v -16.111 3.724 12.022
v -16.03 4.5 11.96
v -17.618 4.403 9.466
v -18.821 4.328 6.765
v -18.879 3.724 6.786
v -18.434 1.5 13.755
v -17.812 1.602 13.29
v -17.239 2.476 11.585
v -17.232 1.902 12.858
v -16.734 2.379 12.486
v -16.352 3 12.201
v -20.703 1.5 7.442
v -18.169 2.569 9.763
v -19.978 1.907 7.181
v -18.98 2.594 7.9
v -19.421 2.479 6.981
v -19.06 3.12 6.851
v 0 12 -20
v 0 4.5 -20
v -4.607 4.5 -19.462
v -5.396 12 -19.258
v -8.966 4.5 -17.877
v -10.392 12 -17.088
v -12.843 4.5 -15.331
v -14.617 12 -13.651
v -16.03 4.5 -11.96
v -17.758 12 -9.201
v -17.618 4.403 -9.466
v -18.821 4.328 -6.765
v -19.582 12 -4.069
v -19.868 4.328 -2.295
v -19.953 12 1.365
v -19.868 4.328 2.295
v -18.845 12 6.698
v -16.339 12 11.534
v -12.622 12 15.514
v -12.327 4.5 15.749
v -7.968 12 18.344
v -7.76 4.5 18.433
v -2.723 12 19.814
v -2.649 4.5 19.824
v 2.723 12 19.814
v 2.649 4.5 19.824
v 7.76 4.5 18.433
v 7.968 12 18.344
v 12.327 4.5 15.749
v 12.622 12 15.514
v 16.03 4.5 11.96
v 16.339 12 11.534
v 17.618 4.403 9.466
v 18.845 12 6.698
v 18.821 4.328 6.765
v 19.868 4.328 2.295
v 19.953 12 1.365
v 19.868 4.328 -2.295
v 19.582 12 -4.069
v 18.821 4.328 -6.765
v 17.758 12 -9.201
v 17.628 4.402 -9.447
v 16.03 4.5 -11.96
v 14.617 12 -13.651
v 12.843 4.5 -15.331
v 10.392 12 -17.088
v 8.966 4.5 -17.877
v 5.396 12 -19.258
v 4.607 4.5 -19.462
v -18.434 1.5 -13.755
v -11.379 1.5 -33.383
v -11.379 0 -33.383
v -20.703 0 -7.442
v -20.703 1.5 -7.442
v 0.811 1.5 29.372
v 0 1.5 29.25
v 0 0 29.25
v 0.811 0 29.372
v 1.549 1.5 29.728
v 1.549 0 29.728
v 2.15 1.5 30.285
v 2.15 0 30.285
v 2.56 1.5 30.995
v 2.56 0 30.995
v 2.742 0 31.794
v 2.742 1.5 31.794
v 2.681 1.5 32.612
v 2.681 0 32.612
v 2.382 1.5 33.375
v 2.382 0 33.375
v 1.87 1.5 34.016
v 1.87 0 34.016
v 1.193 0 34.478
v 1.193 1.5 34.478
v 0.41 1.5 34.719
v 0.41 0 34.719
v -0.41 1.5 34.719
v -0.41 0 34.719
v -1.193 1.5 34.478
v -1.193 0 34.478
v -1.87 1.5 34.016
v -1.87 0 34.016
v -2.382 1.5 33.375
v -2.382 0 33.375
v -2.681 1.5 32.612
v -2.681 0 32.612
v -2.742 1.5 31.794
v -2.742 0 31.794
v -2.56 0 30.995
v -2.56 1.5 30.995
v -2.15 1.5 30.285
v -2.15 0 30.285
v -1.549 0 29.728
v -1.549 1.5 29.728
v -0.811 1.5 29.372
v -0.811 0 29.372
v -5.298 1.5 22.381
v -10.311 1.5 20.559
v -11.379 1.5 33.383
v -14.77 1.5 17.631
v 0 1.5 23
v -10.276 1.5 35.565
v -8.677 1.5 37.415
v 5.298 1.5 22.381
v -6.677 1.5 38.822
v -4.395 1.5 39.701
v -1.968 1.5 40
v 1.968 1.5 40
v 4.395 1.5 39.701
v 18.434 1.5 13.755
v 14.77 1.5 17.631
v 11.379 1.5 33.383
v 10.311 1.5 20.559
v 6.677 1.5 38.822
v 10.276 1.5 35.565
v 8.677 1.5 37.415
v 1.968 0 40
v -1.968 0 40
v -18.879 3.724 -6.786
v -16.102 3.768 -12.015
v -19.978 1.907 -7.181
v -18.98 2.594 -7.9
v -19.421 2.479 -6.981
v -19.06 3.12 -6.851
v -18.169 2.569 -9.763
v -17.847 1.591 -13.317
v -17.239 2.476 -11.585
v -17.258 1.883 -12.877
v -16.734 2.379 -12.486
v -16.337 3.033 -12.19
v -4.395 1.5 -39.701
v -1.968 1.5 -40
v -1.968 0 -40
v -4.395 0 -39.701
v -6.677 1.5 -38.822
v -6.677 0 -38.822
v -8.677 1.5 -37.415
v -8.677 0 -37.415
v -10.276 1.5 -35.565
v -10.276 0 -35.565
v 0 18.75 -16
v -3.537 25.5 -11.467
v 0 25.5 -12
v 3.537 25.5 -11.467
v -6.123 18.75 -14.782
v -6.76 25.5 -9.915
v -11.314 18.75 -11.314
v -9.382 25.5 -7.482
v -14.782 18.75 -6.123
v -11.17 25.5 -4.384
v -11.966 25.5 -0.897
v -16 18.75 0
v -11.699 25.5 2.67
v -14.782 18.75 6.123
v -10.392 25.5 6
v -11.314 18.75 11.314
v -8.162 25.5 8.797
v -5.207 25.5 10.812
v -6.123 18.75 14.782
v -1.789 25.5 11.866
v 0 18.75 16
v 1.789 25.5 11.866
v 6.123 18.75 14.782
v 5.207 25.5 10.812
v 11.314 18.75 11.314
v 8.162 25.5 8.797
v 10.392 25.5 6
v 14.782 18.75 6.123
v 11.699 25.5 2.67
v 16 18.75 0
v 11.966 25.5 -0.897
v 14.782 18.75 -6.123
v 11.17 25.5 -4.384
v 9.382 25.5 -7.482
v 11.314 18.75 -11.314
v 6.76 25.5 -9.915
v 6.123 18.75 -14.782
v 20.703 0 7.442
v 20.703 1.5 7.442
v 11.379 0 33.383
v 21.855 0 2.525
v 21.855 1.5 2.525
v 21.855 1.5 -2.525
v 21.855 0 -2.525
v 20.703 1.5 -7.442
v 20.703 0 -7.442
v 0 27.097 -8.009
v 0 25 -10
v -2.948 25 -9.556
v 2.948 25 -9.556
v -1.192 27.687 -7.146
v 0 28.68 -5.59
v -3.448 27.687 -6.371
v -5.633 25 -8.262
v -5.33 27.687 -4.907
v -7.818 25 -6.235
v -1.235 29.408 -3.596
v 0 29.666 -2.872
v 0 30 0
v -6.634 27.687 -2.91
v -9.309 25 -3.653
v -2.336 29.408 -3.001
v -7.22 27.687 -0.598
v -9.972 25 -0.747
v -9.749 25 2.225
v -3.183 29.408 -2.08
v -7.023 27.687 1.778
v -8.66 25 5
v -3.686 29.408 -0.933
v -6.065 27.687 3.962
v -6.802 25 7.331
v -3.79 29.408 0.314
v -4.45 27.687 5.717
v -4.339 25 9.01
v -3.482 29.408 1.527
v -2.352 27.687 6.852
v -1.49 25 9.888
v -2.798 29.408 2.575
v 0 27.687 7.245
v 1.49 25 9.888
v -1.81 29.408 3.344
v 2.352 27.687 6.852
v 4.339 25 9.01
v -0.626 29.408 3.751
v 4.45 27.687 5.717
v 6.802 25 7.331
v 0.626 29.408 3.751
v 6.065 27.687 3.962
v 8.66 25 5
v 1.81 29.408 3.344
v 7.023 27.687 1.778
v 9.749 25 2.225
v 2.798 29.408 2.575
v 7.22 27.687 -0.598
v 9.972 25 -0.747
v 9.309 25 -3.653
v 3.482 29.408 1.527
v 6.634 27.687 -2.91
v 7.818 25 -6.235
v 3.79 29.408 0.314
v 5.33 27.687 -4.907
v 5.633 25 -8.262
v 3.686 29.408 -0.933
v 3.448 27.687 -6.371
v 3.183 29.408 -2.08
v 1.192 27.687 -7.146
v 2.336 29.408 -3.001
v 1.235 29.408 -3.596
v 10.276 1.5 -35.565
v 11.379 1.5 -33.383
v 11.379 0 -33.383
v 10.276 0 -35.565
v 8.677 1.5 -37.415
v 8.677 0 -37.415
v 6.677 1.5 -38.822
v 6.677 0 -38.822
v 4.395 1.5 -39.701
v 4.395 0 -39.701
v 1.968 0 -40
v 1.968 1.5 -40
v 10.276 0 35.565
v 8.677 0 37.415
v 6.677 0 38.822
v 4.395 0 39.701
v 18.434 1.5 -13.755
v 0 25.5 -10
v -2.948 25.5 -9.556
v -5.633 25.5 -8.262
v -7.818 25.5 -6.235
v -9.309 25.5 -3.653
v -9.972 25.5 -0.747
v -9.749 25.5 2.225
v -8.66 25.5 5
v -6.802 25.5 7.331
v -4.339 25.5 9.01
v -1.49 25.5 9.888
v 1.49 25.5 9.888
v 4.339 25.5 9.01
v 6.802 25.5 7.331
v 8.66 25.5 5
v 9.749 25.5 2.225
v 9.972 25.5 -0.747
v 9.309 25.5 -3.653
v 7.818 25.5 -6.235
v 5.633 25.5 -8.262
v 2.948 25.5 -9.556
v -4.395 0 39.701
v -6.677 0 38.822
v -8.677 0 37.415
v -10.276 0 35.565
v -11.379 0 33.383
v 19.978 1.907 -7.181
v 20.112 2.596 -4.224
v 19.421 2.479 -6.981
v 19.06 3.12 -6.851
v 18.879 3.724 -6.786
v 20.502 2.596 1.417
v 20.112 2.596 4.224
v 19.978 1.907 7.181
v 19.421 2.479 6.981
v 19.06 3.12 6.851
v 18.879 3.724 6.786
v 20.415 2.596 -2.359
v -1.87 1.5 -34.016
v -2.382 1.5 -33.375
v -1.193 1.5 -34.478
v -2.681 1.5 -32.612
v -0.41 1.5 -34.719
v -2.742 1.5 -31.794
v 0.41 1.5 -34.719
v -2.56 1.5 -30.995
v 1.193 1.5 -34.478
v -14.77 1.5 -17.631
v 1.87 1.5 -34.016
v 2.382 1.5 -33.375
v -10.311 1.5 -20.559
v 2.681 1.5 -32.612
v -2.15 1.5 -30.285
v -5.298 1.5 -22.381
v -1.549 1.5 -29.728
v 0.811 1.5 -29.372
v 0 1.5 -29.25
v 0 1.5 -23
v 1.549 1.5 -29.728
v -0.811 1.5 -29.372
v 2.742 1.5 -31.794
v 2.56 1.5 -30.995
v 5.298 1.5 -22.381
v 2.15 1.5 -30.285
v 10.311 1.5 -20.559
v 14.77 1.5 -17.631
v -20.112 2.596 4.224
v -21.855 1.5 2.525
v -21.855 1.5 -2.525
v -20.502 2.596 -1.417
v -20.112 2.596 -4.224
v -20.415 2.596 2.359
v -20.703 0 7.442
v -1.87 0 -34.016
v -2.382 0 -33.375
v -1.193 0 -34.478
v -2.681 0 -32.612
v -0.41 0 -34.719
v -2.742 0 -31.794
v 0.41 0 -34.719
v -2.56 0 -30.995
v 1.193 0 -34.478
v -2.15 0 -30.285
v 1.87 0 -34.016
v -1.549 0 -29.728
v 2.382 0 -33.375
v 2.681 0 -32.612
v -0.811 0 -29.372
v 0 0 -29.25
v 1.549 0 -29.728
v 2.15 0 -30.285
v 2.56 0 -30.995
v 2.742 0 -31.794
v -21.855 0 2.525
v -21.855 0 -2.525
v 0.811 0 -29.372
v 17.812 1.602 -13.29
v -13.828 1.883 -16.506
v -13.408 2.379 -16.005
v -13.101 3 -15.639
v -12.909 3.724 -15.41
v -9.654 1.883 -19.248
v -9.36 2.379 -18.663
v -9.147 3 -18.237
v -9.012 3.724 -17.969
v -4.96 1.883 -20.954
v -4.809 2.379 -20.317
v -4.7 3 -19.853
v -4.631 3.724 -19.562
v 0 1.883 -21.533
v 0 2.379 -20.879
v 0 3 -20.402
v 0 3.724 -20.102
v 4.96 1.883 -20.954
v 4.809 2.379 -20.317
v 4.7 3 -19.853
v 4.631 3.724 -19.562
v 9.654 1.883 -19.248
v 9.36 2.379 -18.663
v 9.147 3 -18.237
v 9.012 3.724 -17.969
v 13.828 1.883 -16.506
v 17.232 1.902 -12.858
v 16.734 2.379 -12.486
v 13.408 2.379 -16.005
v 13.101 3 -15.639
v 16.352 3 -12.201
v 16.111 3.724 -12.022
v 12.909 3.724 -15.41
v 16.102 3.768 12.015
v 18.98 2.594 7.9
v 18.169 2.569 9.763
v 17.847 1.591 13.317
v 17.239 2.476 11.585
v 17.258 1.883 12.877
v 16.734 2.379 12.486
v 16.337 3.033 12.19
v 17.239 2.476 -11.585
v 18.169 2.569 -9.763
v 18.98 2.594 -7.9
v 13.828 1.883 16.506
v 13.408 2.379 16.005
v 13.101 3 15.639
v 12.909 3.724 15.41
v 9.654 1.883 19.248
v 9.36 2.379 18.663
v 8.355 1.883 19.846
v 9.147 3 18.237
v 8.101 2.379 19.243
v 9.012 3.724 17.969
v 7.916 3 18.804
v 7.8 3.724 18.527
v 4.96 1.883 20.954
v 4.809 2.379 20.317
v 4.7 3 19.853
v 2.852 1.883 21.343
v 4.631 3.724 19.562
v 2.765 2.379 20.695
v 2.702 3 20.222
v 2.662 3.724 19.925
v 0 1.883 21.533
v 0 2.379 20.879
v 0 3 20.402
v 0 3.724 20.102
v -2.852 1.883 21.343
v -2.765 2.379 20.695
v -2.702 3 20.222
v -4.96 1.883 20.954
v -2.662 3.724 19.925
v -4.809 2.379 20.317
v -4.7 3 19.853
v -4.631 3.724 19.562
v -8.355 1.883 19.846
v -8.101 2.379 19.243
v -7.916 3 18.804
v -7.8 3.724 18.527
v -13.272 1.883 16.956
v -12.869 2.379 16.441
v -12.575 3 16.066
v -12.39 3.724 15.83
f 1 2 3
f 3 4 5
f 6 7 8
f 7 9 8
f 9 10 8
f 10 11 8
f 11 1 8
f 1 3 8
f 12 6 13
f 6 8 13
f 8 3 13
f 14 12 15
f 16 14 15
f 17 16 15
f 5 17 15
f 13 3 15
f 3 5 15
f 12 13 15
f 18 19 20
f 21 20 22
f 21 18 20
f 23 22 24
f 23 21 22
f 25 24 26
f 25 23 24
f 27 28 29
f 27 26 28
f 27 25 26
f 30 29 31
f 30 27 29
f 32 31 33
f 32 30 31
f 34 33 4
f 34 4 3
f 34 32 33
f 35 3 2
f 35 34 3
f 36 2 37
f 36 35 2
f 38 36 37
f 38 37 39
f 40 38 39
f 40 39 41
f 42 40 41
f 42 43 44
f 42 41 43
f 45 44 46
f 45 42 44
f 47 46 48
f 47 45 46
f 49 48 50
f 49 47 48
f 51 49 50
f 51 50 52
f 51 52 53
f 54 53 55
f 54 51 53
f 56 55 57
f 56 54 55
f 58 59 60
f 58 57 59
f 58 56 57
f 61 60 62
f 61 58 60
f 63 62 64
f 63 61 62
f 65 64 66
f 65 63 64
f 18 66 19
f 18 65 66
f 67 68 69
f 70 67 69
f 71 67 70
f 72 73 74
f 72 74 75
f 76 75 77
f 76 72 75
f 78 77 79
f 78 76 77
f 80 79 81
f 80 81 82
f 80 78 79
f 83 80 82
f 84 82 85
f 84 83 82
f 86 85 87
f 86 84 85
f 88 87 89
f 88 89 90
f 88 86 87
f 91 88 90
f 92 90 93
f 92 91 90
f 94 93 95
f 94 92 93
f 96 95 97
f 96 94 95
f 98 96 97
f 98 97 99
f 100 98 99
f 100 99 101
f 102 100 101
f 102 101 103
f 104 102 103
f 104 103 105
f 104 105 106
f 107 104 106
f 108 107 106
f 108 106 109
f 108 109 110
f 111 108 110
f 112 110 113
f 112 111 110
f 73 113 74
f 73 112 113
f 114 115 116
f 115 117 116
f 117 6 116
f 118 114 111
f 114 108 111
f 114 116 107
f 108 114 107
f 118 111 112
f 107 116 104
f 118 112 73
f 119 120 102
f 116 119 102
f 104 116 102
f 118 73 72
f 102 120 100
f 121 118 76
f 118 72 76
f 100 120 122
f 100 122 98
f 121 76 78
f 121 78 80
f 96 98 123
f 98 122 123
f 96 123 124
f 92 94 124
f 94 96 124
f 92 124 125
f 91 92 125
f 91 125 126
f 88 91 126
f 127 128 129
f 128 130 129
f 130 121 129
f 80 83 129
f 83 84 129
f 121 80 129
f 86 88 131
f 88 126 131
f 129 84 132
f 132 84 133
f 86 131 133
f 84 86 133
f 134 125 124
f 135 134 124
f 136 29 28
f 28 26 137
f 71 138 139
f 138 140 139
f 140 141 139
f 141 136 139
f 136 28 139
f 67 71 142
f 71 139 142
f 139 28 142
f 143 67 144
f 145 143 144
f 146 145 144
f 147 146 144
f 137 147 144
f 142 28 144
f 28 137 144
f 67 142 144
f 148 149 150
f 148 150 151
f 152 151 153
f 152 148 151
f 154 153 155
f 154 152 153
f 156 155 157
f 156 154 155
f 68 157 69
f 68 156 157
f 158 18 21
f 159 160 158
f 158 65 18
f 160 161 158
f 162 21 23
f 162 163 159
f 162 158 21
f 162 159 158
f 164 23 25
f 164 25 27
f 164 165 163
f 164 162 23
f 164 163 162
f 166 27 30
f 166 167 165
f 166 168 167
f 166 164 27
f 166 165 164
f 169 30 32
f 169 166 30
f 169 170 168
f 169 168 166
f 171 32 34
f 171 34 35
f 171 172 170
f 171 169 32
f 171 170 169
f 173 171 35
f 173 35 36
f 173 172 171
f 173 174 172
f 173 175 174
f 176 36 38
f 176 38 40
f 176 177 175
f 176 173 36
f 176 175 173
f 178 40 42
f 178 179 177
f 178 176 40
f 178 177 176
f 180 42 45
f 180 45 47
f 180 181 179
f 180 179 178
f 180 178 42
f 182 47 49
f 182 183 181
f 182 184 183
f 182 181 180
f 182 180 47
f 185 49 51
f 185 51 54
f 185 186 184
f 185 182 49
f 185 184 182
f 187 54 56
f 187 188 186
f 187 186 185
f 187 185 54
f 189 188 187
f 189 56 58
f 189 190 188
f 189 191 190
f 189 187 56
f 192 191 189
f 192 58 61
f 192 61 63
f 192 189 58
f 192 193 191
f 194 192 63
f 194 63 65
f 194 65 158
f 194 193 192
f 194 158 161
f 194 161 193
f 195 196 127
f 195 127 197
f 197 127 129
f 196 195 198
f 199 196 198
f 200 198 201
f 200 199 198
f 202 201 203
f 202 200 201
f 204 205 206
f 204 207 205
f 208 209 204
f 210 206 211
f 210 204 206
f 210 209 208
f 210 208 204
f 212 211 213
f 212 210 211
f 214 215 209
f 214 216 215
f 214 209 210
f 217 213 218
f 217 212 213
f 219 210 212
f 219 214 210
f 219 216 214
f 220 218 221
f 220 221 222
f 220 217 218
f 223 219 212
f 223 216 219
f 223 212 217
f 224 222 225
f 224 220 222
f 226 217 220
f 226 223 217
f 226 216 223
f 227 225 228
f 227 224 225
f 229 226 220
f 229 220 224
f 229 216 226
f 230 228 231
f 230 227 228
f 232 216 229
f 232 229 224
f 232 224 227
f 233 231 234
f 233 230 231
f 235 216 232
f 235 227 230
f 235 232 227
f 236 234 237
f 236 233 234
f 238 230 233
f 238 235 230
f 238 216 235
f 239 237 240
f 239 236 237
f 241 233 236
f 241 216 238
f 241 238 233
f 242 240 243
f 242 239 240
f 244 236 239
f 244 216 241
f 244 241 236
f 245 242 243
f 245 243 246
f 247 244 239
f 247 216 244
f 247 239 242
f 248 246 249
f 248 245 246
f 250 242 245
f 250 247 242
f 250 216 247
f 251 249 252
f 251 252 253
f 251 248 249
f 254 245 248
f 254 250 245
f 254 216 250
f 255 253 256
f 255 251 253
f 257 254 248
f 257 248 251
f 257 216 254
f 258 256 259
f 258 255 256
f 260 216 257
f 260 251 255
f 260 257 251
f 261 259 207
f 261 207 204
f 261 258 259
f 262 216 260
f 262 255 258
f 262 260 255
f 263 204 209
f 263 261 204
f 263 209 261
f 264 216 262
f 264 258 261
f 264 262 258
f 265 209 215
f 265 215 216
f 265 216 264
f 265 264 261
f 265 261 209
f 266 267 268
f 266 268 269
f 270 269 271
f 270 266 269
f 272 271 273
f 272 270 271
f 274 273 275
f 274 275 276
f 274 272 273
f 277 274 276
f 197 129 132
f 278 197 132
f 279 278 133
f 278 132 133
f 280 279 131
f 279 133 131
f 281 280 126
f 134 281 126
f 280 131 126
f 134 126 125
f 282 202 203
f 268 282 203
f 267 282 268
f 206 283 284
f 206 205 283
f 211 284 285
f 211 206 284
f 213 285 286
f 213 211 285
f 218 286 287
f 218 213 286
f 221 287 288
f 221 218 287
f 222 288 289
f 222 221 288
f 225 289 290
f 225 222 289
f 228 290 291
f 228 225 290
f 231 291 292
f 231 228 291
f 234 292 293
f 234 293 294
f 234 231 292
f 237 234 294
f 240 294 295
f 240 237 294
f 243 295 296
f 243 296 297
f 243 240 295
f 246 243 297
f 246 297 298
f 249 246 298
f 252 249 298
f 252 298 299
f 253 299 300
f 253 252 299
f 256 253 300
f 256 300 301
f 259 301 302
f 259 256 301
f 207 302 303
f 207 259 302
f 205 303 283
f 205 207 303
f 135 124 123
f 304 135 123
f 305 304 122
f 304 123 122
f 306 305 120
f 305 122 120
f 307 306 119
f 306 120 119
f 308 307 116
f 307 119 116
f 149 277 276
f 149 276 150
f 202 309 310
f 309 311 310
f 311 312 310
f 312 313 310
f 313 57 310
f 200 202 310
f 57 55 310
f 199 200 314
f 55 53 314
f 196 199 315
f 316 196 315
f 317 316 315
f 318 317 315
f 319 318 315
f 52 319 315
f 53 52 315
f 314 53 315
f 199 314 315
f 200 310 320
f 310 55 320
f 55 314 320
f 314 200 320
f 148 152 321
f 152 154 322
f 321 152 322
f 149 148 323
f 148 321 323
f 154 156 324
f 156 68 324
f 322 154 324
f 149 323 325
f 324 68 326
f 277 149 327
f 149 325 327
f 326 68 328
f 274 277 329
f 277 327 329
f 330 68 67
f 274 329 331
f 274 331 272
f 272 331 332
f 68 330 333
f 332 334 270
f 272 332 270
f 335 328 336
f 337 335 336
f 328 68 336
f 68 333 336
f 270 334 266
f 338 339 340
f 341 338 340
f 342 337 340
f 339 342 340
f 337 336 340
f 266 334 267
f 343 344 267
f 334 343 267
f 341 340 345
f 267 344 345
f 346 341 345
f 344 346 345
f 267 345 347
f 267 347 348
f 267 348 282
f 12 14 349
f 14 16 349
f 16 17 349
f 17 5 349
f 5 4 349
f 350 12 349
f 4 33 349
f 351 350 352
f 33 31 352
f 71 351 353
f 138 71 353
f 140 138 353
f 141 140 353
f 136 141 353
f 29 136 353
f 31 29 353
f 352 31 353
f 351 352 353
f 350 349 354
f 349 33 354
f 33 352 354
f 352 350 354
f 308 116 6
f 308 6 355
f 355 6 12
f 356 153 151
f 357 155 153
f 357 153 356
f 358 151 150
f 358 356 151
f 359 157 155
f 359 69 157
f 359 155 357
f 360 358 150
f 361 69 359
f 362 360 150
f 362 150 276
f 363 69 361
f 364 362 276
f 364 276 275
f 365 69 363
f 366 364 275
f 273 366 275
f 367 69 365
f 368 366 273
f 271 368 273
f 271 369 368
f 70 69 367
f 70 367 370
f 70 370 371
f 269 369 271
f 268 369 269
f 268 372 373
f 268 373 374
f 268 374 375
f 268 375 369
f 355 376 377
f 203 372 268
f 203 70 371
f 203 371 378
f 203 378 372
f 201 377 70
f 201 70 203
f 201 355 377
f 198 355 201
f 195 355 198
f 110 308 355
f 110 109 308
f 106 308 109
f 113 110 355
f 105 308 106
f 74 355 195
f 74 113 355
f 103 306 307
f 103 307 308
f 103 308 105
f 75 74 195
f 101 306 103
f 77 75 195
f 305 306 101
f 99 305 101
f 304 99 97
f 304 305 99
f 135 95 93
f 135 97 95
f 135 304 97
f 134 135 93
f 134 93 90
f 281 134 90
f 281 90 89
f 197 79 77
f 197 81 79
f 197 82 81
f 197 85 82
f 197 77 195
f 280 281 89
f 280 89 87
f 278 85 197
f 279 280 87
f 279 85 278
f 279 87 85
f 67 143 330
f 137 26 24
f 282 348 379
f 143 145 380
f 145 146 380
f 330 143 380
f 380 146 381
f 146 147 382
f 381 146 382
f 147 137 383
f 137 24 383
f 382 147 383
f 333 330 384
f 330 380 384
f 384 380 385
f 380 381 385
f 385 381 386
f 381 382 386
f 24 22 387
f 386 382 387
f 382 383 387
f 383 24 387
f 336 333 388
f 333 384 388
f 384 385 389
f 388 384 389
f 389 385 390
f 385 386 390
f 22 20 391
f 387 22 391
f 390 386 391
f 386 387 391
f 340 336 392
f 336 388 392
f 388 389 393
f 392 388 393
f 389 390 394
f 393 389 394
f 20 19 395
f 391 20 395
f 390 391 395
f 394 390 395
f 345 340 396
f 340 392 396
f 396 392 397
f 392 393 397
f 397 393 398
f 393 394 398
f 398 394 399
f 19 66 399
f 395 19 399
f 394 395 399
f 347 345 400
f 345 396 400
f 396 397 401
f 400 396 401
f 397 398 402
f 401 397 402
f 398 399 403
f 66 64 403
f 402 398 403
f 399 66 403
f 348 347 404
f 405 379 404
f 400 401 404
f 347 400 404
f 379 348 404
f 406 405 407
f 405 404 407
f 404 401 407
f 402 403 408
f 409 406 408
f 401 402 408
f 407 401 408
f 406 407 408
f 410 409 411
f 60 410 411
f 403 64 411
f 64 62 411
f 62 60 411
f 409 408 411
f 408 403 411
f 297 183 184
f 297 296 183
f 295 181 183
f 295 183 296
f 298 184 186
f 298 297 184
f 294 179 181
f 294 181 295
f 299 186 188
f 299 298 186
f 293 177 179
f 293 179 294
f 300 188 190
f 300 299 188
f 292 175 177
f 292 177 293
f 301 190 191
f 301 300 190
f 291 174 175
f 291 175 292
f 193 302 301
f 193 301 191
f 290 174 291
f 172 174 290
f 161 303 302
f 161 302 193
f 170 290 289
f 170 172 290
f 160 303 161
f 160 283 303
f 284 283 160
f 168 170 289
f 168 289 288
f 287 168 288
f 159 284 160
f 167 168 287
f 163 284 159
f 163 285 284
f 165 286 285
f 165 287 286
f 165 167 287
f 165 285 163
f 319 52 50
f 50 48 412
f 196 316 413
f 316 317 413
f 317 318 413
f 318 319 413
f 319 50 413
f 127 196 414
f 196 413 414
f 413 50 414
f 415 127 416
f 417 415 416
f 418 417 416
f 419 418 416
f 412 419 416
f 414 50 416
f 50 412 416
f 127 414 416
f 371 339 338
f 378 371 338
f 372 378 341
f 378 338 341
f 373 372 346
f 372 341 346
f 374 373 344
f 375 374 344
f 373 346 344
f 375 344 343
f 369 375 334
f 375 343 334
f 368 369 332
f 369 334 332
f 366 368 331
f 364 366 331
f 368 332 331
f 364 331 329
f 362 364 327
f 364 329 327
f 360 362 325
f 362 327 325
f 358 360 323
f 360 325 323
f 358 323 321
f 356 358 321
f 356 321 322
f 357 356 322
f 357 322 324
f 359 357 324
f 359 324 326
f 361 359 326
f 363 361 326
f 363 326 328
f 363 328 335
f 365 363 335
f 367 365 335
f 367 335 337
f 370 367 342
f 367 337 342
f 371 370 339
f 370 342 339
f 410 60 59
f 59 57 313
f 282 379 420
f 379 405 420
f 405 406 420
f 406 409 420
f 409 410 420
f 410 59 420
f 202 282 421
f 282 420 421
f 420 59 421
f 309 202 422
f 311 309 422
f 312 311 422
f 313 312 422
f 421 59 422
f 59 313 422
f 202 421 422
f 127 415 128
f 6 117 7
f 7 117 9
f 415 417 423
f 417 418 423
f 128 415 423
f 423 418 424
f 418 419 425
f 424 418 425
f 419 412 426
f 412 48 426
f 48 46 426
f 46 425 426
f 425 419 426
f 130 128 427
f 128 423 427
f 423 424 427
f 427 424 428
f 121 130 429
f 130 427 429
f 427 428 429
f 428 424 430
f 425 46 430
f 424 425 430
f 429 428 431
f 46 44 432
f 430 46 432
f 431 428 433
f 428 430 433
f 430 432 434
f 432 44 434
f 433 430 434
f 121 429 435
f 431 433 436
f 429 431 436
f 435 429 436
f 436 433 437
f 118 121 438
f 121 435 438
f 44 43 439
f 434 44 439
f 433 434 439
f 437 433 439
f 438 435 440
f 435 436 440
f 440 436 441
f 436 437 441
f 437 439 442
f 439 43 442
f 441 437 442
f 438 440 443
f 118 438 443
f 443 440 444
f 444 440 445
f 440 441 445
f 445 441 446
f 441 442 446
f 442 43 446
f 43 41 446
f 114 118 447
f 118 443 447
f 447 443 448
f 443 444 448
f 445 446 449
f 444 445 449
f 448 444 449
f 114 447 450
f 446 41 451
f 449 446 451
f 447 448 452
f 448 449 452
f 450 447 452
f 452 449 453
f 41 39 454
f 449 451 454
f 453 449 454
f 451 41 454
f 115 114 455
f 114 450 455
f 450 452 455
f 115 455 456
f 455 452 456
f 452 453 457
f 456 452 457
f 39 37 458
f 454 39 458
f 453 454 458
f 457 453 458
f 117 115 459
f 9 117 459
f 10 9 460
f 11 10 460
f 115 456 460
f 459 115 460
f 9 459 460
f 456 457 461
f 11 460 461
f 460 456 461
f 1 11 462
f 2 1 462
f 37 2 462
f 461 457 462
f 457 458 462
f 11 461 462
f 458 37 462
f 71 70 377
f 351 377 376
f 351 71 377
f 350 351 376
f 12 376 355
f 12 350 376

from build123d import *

# Parameters (mm, degrees)
BOSS_EXTRUDE1_START = 1.5
SKETCH2_R           = 2.75
SKETCH2_R_2         = 20
BOSS_EXTRUDE1_DEPTH = 1.5
FILLET1_R           = 3


with BuildPart() as part:
    # Sketch1 → Revolve1 (revolve)
    with BuildSketch(Plane.XY, mode=Mode.PRIVATE) as revolve1_sk:
        with BuildLine():
            ThreePointArc((0, 30), (-12.5, 17.5), (0, 5))
            Line((0, 5), (0, 30))
        make_face()
        with BuildLine():
            Line((0, 30), (0, 5))
            ThreePointArc((0, 5), (8.838834765, 8.661165235), (12.5, 17.5))
            ThreePointArc((12.5, 17.5), (11.858541226, 21.452847075), (10, 25))
            ThreePointArc((10, 25), (5.590169944, 28.680339887), (0, 30))
        make_face()
        with BuildLine():
            Line((0, 5), (0, 0))
            Line((0, 0), (20, 0))
            Line((20, 0), (20, 12))
            Line((20, 12), (12, 25.5))
            Line((12, 25.5), (10, 25.5))
            Line((10, 25.5), (10, 25))
            ThreePointArc((10, 25), (11.858541226, 21.452847075), (12.5, 17.5))
            ThreePointArc((12.5, 17.5), (8.838834765, 8.661165235), (0, 5))
        make_face()
    revolve(revolve1_sk.sketch.rotate(Axis((0, 0, 0), (0, 1, 0)), 90), axis=Axis((0, 0, 0), (0, 1, 0)))

    # Sketch2 → Boss-Extrude1 (add)
    with BuildSketch(Plane(origin=(0, 0, 0), x_dir=(1, 0, 0), z_dir=(0, 1, 0)).offset(BOSS_EXTRUDE1_START)):
        with BuildLine():
            Line((-11.378629516, 33.382634205), (-20.703132213, 7.441795252))
            ThreePointArc((-20.703132213, 7.441795252), (0, -22), (20.703132213, 7.441795252))
            Line((20.703132213, 7.441795252), (11.378629516, 33.382634205))
            ThreePointArc((11.378629516, 33.382634205), (7.720230047, 38.180047129), (1.968114874, 40))
            Line((1.968114874, 40), (-1.968114874, 40))
            ThreePointArc((-1.968114874, 40), (-7.720230047, 38.180047129), (-11.378629516, 33.382634205))
        make_face()
        with Locations(Location((0, 32, 0), (0, 0, 270))):
            Circle(SKETCH2_R, mode=Mode.SUBTRACT)
        with Locations(Location((0, 0, 0), (0, 0, 90))):
            Circle(SKETCH2_R_2, mode=Mode.SUBTRACT)
    boss_extrude1 = extrude(amount=-BOSS_EXTRUDE1_DEPTH)

    # Mirror1: Boss-Extrude1 across plane
    add(boss_extrude1.mirror(Plane.XY))

    # Fillet1
    fillet1_edges = [part.edges().sort_by_distance(p)[0] for p in [
        (0, 1.5, 20),
    ]]
    fillet(fillet1_edges, radius=FILLET1_R)


solid = part.part
